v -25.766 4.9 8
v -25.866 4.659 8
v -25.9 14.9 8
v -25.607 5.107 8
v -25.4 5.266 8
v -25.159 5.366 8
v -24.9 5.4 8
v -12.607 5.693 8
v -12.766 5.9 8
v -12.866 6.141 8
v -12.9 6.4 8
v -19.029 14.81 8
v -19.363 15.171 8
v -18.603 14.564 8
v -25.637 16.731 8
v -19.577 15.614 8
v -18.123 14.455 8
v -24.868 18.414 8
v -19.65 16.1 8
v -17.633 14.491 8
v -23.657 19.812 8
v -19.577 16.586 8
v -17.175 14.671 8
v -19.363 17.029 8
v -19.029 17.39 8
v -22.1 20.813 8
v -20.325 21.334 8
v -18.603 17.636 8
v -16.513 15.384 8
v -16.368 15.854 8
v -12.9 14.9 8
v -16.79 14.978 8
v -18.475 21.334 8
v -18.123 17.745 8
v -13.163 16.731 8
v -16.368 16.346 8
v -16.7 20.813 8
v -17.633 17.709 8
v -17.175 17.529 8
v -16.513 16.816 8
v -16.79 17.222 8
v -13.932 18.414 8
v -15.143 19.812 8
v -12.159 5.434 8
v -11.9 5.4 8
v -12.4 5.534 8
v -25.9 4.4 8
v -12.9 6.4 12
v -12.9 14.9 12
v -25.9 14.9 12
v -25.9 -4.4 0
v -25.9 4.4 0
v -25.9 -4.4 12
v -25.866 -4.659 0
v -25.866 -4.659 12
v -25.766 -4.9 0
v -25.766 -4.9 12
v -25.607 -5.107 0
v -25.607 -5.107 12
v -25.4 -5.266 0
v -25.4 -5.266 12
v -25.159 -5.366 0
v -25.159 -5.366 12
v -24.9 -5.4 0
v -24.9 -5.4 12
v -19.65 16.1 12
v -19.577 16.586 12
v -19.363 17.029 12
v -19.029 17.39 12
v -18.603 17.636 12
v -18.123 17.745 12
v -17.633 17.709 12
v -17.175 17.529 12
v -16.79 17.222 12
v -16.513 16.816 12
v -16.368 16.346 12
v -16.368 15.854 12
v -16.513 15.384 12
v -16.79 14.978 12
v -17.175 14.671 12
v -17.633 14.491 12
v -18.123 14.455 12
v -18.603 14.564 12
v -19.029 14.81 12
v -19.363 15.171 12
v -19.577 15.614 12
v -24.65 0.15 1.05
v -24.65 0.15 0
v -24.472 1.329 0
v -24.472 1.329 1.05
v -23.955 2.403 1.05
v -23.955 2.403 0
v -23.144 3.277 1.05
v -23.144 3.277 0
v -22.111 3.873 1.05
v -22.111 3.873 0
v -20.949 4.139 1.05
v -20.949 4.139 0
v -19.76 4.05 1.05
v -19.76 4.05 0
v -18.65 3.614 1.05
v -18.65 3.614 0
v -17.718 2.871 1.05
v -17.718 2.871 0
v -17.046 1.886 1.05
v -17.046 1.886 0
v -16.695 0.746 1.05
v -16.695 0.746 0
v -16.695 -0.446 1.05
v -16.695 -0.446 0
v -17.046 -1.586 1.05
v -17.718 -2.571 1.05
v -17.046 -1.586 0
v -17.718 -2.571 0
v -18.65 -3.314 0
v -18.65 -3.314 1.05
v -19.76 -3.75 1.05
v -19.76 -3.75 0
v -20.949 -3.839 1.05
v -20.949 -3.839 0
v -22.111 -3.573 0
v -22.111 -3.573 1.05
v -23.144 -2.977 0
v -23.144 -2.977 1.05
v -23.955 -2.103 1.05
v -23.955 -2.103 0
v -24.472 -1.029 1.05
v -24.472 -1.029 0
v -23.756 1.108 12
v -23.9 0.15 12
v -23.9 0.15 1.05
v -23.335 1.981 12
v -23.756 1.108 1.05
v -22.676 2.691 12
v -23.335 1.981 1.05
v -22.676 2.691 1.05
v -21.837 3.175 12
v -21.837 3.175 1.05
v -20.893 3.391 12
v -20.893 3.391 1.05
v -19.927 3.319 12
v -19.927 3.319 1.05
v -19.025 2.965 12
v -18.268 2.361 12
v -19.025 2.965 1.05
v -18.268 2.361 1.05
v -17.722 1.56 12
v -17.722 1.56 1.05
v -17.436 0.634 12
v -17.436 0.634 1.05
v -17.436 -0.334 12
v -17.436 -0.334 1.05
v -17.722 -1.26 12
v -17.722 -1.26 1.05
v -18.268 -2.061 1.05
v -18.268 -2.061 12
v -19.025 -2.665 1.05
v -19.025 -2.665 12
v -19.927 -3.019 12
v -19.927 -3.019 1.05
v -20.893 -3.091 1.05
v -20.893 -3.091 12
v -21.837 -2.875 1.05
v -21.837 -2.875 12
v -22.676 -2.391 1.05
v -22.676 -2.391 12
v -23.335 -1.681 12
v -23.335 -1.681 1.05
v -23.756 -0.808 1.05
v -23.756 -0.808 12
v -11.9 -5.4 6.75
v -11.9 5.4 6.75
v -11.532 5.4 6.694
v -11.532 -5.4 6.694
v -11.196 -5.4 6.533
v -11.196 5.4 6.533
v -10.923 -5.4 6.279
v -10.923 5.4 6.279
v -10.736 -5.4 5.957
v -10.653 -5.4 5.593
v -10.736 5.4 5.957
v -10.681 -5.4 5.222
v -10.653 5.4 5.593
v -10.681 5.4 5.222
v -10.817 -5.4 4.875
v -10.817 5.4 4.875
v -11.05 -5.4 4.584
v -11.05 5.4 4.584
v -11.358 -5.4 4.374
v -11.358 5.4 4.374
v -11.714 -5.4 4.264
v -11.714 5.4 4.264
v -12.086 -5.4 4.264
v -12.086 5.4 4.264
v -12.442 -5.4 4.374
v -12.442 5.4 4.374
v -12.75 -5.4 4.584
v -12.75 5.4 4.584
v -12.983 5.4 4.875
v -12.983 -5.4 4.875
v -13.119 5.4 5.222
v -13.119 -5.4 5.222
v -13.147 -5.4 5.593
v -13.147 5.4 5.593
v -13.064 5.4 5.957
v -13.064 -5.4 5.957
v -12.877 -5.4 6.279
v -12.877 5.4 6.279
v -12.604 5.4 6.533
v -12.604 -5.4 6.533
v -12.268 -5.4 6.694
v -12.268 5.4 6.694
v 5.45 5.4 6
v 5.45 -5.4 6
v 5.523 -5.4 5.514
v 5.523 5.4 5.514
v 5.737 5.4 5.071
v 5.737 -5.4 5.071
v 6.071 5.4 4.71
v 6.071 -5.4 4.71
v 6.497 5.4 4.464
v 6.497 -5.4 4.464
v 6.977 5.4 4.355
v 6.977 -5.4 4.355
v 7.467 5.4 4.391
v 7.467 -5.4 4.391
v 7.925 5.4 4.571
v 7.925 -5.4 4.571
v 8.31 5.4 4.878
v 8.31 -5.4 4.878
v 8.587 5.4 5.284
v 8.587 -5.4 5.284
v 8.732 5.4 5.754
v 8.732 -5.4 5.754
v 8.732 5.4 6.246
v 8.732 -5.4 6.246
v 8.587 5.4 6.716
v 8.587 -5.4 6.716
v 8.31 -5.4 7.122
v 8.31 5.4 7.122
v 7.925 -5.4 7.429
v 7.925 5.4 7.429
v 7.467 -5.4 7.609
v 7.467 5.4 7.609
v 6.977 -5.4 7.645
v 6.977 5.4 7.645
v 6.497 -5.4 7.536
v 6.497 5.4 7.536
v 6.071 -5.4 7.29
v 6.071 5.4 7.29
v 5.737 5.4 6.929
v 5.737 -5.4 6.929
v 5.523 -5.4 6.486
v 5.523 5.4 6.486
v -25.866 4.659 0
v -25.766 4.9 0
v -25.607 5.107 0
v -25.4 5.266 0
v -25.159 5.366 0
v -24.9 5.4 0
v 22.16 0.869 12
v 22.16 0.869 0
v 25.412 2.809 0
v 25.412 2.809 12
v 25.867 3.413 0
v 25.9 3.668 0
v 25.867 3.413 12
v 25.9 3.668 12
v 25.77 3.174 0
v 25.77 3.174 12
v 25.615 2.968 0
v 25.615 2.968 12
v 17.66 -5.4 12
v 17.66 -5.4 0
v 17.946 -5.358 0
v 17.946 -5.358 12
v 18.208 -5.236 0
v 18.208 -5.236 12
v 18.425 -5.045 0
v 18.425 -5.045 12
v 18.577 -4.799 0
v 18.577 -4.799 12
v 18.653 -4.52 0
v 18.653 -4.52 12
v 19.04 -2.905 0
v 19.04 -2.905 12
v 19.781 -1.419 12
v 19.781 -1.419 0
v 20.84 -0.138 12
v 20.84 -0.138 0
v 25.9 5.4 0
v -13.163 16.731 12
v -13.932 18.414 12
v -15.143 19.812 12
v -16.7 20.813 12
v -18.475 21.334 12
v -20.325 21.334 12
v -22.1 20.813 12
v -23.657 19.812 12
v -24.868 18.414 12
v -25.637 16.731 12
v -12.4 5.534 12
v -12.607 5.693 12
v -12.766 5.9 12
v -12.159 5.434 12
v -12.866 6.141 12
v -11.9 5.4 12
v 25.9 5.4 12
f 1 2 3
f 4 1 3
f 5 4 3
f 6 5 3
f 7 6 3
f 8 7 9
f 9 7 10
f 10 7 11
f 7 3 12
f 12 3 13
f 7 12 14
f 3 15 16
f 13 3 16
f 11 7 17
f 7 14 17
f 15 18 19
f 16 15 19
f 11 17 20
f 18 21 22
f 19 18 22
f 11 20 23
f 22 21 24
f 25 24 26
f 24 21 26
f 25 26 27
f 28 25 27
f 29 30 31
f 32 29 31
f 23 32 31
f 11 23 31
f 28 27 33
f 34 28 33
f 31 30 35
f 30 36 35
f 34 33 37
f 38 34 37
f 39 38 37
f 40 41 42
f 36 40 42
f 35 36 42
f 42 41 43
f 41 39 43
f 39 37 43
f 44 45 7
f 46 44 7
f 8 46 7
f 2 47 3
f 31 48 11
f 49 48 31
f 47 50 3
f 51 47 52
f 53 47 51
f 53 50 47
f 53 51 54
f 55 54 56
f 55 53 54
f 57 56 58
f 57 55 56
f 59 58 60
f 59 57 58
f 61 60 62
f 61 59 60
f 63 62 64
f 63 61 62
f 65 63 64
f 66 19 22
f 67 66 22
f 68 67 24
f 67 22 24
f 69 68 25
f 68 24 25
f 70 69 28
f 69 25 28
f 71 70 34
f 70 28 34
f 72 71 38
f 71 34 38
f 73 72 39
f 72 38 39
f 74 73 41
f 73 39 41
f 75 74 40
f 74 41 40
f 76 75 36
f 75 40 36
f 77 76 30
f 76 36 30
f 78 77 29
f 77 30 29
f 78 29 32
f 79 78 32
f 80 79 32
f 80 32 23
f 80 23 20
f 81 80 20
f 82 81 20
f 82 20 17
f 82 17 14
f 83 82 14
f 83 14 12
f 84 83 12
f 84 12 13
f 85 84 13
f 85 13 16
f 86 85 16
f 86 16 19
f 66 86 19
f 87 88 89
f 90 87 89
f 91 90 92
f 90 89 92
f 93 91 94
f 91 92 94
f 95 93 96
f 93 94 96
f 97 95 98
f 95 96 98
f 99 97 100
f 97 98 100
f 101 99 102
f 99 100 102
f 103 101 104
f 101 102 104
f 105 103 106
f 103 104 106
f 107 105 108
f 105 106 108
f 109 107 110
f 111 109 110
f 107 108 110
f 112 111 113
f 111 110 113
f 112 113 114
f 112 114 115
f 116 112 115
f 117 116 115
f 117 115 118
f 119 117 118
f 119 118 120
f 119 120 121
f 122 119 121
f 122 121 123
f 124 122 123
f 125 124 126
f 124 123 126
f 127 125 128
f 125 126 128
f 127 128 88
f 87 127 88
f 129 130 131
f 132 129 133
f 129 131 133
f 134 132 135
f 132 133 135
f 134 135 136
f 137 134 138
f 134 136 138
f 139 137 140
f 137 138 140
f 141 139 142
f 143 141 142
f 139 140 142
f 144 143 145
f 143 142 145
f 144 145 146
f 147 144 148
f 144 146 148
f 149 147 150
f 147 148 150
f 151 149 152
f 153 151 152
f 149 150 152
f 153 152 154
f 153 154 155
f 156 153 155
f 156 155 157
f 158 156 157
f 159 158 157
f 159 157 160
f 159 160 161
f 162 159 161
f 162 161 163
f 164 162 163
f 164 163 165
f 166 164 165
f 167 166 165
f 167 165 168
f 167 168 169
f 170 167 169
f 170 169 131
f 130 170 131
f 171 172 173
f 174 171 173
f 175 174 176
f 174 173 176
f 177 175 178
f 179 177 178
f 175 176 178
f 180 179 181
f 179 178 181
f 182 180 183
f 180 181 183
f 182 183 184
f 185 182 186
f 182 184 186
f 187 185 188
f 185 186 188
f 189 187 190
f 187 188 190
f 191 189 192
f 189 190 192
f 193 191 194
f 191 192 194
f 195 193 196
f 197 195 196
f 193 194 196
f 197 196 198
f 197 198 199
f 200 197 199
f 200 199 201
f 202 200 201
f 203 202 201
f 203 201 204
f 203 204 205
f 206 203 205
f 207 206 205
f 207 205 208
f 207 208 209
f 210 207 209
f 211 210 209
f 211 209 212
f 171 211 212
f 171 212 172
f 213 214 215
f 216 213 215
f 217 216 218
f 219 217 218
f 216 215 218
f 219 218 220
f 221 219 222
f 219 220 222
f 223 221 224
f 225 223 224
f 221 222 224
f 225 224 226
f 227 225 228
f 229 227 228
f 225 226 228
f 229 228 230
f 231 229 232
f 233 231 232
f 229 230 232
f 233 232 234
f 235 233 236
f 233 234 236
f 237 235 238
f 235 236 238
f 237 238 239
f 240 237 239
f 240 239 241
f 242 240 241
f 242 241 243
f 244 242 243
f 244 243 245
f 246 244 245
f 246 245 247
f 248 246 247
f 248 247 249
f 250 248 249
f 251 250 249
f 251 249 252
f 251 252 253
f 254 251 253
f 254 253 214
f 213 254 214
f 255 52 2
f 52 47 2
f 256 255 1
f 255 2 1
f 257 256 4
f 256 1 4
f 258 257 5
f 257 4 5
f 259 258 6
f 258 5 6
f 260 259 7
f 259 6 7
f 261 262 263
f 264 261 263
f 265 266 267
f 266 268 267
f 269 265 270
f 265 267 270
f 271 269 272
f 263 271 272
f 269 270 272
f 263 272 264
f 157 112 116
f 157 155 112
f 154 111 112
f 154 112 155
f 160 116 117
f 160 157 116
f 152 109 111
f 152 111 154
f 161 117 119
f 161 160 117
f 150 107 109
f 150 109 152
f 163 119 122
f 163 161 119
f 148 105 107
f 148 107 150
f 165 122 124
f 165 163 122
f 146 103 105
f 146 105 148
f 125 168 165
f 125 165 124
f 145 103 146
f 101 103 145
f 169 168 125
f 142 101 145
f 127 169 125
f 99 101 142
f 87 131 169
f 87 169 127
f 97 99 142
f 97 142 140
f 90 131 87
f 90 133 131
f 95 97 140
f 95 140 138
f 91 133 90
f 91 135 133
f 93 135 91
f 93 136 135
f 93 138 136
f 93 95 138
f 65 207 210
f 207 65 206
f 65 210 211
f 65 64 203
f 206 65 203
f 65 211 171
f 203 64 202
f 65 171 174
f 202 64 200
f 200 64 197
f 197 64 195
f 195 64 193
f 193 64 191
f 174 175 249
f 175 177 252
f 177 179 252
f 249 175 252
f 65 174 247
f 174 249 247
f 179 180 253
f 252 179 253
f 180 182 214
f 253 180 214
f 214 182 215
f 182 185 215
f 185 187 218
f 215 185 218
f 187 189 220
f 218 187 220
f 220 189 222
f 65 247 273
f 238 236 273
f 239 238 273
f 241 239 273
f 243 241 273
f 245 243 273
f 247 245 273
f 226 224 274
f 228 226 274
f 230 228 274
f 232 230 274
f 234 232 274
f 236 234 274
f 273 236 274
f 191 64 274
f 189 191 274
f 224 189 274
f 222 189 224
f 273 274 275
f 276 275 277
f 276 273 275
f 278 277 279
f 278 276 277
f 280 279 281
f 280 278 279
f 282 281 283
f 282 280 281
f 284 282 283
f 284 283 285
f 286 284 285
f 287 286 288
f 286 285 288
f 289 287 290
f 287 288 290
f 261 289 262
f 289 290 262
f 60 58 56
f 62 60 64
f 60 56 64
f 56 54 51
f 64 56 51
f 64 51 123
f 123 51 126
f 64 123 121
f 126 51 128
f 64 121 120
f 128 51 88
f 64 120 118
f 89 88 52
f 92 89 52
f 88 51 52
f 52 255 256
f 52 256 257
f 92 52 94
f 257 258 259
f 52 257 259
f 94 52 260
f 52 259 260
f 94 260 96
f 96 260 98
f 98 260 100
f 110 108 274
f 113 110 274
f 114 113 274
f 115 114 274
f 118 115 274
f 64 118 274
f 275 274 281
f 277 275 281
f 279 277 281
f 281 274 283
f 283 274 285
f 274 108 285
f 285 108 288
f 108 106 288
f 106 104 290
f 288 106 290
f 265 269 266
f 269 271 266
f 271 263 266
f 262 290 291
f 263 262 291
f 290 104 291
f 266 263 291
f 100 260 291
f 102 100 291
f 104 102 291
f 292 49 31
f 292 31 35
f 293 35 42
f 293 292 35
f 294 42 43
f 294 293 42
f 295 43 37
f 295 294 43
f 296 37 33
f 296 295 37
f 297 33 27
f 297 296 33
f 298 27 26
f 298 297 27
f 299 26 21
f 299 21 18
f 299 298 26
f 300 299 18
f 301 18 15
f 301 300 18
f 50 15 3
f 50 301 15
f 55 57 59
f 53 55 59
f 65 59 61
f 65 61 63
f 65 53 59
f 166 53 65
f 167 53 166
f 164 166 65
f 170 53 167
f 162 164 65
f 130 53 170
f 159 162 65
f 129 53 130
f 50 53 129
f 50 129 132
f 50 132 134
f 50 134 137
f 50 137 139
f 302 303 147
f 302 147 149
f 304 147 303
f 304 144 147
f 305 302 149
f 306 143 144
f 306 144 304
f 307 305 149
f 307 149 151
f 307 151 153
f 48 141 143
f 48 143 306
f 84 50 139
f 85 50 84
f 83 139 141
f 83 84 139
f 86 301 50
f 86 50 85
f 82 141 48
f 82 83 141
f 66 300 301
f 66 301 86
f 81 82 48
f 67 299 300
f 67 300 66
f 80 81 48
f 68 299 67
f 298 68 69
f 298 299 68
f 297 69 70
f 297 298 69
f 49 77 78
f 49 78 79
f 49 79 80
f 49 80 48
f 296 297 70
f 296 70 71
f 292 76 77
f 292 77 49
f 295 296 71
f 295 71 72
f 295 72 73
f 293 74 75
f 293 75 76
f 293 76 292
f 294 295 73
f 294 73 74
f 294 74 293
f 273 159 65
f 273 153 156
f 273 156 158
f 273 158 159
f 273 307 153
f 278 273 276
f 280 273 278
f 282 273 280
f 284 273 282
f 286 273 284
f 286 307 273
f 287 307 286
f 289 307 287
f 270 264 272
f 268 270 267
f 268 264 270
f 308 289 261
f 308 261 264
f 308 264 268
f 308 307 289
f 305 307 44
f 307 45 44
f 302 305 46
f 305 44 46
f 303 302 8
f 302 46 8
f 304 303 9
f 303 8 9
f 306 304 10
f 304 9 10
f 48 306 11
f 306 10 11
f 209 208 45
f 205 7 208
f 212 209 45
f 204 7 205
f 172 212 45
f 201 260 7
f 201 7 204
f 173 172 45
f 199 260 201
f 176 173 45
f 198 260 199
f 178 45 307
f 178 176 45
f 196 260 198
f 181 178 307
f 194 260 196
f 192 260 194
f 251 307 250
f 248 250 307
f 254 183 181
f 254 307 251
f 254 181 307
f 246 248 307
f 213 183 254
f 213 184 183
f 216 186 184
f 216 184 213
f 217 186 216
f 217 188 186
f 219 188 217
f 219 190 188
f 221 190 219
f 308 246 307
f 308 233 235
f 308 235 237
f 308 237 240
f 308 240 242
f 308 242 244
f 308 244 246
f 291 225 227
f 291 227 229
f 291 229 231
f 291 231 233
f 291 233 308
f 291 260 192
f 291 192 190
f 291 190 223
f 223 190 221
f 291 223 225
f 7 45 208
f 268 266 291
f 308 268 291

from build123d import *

# Parameters (mm, degrees)
SKETCH1_W           = 51.8
SKETCH1_H           = 10.8
BOSS_EXTRUDE1_DEPTH = 12
BOSS_EXTRUDE2_DEPTH = 4
CUT_EXTRUDE1_DEPTH  = 36.675902231
FILLET1_R           = 1
SKETCH4_R           = 3.25
CUT_EXTRUDE2_DEPTH  = 36.675902231
SKETCH5_R           = 4
CUT_EXTRUDE3_DEPTH  = 1.05
M4_TAPPED_HOLE1_D   = 3.3
SKETCH8_R           = 1.25
CUT_EXTRUDE4_DEPTH  = 33.723233337
M4_TAPPED_HOLE2_D   = 3.3


with BuildPart() as part:
    # Sketch1 → Boss-Extrude1 (new body)
    with BuildSketch(Plane.XY):
        Rectangle(SKETCH1_W, SKETCH1_H)
    extrude(amount=BOSS_EXTRUDE1_DEPTH)

    # Sketch2 → Boss-Extrude2 (add)
    with BuildSketch(Plane.XY.offset(12)):
        with BuildLine():
            Line((-25.9, 14.9), (-25.9, 5.4))
            Line((-25.9, 5.4), (-12.9, 5.4))
            Line((-12.9, 5.4), (-12.9, 14.9))
            ThreePointArc((-12.9, 14.9), (-19.4, 21.4), (-25.9, 14.9))
        make_face()
    extrude(amount=-BOSS_EXTRUDE2_DEPTH)

    # Sketch3 → Cut-Extrude1 (cut, through all)
    with BuildSketch(Plane(origin=(0, 0, 0), x_dir=(-1, 0, 0), z_dir=(0, 0, -1))):
        with BuildLine():
            Line((-22.160417654, 0.869411765), (-25.9, 3.1))
            Line((-25.9, 3.1), (-25.9, -5.4))
            Line((-25.9, -5.4), (-18.6, -5.4))
            ThreePointArc((-18.6, -5.4), (-19.552207032, -1.795069427), (-22.160417654, 0.869411765))
        make_face()
    extrude(amount=-CUT_EXTRUDE1_DEPTH, mode=Mode.SUBTRACT)

    # Fillet1
    fillet1_edges = [part.edges().sort_by_distance(p)[0] for p in [
        (-25.9, 5.4, 4),
        (-12.9, 5.4, 10),
        (18.6, -5.4, 6),
        (25.9, 3.1, 6),
        (-25.9, -5.4, 6),
    ]]
    fillet(fillet1_edges, radius=FILLET1_R)

    # Sketch4 → Cut-Extrude2 (cut, through all)
    with BuildSketch(Plane(origin=(0, 0, 0), x_dir=(-1, 0, 0), z_dir=(0, 0, -1))):
        with Locations((20.65, 0.15)):
            Circle(SKETCH4_R)
    extrude(amount=-CUT_EXTRUDE2_DEPTH, mode=Mode.SUBTRACT)

    # Sketch5 → Cut-Extrude3 (cut)
    with BuildSketch(Plane(origin=(0, 0, 0), x_dir=(-1, 0, 0), z_dir=(0, 0, -1))):
        with Locations((20.65, 0.15)):
            Circle(SKETCH5_R)
    extrude(amount=-CUT_EXTRUDE3_DEPTH, mode=Mode.SUBTRACT)

    # M4 Tapped Hole1 (through all)
    with Locations(Plane(origin=(0, 5.4, 0), x_dir=(1, 0, 0), z_dir=(0, 1, 0))):
        with Locations((7.1, -6)):
            Hole(M4_TAPPED_HOLE1_D / 2)

    # Sketch8 → Cut-Extrude4 (cut, through all)
    with BuildSketch(Plane(origin=(0, 5.4, 0), x_dir=(1, 0, 0), z_dir=(0, 1, 0))):
        with Locations(Location((-11.9, -5.5, 0), (0, 0, 270))):
            Circle(SKETCH8_R)
    extrude(amount=-CUT_EXTRUDE4_DEPTH, mode=Mode.SUBTRACT)

    # M4 Tapped Hole2 (through all)
    with Locations(Plane.XY.offset(12)):
        with Locations((-18, 16.1)):
            Hole(M4_TAPPED_HOLE2_D / 2)


solid = part.part
